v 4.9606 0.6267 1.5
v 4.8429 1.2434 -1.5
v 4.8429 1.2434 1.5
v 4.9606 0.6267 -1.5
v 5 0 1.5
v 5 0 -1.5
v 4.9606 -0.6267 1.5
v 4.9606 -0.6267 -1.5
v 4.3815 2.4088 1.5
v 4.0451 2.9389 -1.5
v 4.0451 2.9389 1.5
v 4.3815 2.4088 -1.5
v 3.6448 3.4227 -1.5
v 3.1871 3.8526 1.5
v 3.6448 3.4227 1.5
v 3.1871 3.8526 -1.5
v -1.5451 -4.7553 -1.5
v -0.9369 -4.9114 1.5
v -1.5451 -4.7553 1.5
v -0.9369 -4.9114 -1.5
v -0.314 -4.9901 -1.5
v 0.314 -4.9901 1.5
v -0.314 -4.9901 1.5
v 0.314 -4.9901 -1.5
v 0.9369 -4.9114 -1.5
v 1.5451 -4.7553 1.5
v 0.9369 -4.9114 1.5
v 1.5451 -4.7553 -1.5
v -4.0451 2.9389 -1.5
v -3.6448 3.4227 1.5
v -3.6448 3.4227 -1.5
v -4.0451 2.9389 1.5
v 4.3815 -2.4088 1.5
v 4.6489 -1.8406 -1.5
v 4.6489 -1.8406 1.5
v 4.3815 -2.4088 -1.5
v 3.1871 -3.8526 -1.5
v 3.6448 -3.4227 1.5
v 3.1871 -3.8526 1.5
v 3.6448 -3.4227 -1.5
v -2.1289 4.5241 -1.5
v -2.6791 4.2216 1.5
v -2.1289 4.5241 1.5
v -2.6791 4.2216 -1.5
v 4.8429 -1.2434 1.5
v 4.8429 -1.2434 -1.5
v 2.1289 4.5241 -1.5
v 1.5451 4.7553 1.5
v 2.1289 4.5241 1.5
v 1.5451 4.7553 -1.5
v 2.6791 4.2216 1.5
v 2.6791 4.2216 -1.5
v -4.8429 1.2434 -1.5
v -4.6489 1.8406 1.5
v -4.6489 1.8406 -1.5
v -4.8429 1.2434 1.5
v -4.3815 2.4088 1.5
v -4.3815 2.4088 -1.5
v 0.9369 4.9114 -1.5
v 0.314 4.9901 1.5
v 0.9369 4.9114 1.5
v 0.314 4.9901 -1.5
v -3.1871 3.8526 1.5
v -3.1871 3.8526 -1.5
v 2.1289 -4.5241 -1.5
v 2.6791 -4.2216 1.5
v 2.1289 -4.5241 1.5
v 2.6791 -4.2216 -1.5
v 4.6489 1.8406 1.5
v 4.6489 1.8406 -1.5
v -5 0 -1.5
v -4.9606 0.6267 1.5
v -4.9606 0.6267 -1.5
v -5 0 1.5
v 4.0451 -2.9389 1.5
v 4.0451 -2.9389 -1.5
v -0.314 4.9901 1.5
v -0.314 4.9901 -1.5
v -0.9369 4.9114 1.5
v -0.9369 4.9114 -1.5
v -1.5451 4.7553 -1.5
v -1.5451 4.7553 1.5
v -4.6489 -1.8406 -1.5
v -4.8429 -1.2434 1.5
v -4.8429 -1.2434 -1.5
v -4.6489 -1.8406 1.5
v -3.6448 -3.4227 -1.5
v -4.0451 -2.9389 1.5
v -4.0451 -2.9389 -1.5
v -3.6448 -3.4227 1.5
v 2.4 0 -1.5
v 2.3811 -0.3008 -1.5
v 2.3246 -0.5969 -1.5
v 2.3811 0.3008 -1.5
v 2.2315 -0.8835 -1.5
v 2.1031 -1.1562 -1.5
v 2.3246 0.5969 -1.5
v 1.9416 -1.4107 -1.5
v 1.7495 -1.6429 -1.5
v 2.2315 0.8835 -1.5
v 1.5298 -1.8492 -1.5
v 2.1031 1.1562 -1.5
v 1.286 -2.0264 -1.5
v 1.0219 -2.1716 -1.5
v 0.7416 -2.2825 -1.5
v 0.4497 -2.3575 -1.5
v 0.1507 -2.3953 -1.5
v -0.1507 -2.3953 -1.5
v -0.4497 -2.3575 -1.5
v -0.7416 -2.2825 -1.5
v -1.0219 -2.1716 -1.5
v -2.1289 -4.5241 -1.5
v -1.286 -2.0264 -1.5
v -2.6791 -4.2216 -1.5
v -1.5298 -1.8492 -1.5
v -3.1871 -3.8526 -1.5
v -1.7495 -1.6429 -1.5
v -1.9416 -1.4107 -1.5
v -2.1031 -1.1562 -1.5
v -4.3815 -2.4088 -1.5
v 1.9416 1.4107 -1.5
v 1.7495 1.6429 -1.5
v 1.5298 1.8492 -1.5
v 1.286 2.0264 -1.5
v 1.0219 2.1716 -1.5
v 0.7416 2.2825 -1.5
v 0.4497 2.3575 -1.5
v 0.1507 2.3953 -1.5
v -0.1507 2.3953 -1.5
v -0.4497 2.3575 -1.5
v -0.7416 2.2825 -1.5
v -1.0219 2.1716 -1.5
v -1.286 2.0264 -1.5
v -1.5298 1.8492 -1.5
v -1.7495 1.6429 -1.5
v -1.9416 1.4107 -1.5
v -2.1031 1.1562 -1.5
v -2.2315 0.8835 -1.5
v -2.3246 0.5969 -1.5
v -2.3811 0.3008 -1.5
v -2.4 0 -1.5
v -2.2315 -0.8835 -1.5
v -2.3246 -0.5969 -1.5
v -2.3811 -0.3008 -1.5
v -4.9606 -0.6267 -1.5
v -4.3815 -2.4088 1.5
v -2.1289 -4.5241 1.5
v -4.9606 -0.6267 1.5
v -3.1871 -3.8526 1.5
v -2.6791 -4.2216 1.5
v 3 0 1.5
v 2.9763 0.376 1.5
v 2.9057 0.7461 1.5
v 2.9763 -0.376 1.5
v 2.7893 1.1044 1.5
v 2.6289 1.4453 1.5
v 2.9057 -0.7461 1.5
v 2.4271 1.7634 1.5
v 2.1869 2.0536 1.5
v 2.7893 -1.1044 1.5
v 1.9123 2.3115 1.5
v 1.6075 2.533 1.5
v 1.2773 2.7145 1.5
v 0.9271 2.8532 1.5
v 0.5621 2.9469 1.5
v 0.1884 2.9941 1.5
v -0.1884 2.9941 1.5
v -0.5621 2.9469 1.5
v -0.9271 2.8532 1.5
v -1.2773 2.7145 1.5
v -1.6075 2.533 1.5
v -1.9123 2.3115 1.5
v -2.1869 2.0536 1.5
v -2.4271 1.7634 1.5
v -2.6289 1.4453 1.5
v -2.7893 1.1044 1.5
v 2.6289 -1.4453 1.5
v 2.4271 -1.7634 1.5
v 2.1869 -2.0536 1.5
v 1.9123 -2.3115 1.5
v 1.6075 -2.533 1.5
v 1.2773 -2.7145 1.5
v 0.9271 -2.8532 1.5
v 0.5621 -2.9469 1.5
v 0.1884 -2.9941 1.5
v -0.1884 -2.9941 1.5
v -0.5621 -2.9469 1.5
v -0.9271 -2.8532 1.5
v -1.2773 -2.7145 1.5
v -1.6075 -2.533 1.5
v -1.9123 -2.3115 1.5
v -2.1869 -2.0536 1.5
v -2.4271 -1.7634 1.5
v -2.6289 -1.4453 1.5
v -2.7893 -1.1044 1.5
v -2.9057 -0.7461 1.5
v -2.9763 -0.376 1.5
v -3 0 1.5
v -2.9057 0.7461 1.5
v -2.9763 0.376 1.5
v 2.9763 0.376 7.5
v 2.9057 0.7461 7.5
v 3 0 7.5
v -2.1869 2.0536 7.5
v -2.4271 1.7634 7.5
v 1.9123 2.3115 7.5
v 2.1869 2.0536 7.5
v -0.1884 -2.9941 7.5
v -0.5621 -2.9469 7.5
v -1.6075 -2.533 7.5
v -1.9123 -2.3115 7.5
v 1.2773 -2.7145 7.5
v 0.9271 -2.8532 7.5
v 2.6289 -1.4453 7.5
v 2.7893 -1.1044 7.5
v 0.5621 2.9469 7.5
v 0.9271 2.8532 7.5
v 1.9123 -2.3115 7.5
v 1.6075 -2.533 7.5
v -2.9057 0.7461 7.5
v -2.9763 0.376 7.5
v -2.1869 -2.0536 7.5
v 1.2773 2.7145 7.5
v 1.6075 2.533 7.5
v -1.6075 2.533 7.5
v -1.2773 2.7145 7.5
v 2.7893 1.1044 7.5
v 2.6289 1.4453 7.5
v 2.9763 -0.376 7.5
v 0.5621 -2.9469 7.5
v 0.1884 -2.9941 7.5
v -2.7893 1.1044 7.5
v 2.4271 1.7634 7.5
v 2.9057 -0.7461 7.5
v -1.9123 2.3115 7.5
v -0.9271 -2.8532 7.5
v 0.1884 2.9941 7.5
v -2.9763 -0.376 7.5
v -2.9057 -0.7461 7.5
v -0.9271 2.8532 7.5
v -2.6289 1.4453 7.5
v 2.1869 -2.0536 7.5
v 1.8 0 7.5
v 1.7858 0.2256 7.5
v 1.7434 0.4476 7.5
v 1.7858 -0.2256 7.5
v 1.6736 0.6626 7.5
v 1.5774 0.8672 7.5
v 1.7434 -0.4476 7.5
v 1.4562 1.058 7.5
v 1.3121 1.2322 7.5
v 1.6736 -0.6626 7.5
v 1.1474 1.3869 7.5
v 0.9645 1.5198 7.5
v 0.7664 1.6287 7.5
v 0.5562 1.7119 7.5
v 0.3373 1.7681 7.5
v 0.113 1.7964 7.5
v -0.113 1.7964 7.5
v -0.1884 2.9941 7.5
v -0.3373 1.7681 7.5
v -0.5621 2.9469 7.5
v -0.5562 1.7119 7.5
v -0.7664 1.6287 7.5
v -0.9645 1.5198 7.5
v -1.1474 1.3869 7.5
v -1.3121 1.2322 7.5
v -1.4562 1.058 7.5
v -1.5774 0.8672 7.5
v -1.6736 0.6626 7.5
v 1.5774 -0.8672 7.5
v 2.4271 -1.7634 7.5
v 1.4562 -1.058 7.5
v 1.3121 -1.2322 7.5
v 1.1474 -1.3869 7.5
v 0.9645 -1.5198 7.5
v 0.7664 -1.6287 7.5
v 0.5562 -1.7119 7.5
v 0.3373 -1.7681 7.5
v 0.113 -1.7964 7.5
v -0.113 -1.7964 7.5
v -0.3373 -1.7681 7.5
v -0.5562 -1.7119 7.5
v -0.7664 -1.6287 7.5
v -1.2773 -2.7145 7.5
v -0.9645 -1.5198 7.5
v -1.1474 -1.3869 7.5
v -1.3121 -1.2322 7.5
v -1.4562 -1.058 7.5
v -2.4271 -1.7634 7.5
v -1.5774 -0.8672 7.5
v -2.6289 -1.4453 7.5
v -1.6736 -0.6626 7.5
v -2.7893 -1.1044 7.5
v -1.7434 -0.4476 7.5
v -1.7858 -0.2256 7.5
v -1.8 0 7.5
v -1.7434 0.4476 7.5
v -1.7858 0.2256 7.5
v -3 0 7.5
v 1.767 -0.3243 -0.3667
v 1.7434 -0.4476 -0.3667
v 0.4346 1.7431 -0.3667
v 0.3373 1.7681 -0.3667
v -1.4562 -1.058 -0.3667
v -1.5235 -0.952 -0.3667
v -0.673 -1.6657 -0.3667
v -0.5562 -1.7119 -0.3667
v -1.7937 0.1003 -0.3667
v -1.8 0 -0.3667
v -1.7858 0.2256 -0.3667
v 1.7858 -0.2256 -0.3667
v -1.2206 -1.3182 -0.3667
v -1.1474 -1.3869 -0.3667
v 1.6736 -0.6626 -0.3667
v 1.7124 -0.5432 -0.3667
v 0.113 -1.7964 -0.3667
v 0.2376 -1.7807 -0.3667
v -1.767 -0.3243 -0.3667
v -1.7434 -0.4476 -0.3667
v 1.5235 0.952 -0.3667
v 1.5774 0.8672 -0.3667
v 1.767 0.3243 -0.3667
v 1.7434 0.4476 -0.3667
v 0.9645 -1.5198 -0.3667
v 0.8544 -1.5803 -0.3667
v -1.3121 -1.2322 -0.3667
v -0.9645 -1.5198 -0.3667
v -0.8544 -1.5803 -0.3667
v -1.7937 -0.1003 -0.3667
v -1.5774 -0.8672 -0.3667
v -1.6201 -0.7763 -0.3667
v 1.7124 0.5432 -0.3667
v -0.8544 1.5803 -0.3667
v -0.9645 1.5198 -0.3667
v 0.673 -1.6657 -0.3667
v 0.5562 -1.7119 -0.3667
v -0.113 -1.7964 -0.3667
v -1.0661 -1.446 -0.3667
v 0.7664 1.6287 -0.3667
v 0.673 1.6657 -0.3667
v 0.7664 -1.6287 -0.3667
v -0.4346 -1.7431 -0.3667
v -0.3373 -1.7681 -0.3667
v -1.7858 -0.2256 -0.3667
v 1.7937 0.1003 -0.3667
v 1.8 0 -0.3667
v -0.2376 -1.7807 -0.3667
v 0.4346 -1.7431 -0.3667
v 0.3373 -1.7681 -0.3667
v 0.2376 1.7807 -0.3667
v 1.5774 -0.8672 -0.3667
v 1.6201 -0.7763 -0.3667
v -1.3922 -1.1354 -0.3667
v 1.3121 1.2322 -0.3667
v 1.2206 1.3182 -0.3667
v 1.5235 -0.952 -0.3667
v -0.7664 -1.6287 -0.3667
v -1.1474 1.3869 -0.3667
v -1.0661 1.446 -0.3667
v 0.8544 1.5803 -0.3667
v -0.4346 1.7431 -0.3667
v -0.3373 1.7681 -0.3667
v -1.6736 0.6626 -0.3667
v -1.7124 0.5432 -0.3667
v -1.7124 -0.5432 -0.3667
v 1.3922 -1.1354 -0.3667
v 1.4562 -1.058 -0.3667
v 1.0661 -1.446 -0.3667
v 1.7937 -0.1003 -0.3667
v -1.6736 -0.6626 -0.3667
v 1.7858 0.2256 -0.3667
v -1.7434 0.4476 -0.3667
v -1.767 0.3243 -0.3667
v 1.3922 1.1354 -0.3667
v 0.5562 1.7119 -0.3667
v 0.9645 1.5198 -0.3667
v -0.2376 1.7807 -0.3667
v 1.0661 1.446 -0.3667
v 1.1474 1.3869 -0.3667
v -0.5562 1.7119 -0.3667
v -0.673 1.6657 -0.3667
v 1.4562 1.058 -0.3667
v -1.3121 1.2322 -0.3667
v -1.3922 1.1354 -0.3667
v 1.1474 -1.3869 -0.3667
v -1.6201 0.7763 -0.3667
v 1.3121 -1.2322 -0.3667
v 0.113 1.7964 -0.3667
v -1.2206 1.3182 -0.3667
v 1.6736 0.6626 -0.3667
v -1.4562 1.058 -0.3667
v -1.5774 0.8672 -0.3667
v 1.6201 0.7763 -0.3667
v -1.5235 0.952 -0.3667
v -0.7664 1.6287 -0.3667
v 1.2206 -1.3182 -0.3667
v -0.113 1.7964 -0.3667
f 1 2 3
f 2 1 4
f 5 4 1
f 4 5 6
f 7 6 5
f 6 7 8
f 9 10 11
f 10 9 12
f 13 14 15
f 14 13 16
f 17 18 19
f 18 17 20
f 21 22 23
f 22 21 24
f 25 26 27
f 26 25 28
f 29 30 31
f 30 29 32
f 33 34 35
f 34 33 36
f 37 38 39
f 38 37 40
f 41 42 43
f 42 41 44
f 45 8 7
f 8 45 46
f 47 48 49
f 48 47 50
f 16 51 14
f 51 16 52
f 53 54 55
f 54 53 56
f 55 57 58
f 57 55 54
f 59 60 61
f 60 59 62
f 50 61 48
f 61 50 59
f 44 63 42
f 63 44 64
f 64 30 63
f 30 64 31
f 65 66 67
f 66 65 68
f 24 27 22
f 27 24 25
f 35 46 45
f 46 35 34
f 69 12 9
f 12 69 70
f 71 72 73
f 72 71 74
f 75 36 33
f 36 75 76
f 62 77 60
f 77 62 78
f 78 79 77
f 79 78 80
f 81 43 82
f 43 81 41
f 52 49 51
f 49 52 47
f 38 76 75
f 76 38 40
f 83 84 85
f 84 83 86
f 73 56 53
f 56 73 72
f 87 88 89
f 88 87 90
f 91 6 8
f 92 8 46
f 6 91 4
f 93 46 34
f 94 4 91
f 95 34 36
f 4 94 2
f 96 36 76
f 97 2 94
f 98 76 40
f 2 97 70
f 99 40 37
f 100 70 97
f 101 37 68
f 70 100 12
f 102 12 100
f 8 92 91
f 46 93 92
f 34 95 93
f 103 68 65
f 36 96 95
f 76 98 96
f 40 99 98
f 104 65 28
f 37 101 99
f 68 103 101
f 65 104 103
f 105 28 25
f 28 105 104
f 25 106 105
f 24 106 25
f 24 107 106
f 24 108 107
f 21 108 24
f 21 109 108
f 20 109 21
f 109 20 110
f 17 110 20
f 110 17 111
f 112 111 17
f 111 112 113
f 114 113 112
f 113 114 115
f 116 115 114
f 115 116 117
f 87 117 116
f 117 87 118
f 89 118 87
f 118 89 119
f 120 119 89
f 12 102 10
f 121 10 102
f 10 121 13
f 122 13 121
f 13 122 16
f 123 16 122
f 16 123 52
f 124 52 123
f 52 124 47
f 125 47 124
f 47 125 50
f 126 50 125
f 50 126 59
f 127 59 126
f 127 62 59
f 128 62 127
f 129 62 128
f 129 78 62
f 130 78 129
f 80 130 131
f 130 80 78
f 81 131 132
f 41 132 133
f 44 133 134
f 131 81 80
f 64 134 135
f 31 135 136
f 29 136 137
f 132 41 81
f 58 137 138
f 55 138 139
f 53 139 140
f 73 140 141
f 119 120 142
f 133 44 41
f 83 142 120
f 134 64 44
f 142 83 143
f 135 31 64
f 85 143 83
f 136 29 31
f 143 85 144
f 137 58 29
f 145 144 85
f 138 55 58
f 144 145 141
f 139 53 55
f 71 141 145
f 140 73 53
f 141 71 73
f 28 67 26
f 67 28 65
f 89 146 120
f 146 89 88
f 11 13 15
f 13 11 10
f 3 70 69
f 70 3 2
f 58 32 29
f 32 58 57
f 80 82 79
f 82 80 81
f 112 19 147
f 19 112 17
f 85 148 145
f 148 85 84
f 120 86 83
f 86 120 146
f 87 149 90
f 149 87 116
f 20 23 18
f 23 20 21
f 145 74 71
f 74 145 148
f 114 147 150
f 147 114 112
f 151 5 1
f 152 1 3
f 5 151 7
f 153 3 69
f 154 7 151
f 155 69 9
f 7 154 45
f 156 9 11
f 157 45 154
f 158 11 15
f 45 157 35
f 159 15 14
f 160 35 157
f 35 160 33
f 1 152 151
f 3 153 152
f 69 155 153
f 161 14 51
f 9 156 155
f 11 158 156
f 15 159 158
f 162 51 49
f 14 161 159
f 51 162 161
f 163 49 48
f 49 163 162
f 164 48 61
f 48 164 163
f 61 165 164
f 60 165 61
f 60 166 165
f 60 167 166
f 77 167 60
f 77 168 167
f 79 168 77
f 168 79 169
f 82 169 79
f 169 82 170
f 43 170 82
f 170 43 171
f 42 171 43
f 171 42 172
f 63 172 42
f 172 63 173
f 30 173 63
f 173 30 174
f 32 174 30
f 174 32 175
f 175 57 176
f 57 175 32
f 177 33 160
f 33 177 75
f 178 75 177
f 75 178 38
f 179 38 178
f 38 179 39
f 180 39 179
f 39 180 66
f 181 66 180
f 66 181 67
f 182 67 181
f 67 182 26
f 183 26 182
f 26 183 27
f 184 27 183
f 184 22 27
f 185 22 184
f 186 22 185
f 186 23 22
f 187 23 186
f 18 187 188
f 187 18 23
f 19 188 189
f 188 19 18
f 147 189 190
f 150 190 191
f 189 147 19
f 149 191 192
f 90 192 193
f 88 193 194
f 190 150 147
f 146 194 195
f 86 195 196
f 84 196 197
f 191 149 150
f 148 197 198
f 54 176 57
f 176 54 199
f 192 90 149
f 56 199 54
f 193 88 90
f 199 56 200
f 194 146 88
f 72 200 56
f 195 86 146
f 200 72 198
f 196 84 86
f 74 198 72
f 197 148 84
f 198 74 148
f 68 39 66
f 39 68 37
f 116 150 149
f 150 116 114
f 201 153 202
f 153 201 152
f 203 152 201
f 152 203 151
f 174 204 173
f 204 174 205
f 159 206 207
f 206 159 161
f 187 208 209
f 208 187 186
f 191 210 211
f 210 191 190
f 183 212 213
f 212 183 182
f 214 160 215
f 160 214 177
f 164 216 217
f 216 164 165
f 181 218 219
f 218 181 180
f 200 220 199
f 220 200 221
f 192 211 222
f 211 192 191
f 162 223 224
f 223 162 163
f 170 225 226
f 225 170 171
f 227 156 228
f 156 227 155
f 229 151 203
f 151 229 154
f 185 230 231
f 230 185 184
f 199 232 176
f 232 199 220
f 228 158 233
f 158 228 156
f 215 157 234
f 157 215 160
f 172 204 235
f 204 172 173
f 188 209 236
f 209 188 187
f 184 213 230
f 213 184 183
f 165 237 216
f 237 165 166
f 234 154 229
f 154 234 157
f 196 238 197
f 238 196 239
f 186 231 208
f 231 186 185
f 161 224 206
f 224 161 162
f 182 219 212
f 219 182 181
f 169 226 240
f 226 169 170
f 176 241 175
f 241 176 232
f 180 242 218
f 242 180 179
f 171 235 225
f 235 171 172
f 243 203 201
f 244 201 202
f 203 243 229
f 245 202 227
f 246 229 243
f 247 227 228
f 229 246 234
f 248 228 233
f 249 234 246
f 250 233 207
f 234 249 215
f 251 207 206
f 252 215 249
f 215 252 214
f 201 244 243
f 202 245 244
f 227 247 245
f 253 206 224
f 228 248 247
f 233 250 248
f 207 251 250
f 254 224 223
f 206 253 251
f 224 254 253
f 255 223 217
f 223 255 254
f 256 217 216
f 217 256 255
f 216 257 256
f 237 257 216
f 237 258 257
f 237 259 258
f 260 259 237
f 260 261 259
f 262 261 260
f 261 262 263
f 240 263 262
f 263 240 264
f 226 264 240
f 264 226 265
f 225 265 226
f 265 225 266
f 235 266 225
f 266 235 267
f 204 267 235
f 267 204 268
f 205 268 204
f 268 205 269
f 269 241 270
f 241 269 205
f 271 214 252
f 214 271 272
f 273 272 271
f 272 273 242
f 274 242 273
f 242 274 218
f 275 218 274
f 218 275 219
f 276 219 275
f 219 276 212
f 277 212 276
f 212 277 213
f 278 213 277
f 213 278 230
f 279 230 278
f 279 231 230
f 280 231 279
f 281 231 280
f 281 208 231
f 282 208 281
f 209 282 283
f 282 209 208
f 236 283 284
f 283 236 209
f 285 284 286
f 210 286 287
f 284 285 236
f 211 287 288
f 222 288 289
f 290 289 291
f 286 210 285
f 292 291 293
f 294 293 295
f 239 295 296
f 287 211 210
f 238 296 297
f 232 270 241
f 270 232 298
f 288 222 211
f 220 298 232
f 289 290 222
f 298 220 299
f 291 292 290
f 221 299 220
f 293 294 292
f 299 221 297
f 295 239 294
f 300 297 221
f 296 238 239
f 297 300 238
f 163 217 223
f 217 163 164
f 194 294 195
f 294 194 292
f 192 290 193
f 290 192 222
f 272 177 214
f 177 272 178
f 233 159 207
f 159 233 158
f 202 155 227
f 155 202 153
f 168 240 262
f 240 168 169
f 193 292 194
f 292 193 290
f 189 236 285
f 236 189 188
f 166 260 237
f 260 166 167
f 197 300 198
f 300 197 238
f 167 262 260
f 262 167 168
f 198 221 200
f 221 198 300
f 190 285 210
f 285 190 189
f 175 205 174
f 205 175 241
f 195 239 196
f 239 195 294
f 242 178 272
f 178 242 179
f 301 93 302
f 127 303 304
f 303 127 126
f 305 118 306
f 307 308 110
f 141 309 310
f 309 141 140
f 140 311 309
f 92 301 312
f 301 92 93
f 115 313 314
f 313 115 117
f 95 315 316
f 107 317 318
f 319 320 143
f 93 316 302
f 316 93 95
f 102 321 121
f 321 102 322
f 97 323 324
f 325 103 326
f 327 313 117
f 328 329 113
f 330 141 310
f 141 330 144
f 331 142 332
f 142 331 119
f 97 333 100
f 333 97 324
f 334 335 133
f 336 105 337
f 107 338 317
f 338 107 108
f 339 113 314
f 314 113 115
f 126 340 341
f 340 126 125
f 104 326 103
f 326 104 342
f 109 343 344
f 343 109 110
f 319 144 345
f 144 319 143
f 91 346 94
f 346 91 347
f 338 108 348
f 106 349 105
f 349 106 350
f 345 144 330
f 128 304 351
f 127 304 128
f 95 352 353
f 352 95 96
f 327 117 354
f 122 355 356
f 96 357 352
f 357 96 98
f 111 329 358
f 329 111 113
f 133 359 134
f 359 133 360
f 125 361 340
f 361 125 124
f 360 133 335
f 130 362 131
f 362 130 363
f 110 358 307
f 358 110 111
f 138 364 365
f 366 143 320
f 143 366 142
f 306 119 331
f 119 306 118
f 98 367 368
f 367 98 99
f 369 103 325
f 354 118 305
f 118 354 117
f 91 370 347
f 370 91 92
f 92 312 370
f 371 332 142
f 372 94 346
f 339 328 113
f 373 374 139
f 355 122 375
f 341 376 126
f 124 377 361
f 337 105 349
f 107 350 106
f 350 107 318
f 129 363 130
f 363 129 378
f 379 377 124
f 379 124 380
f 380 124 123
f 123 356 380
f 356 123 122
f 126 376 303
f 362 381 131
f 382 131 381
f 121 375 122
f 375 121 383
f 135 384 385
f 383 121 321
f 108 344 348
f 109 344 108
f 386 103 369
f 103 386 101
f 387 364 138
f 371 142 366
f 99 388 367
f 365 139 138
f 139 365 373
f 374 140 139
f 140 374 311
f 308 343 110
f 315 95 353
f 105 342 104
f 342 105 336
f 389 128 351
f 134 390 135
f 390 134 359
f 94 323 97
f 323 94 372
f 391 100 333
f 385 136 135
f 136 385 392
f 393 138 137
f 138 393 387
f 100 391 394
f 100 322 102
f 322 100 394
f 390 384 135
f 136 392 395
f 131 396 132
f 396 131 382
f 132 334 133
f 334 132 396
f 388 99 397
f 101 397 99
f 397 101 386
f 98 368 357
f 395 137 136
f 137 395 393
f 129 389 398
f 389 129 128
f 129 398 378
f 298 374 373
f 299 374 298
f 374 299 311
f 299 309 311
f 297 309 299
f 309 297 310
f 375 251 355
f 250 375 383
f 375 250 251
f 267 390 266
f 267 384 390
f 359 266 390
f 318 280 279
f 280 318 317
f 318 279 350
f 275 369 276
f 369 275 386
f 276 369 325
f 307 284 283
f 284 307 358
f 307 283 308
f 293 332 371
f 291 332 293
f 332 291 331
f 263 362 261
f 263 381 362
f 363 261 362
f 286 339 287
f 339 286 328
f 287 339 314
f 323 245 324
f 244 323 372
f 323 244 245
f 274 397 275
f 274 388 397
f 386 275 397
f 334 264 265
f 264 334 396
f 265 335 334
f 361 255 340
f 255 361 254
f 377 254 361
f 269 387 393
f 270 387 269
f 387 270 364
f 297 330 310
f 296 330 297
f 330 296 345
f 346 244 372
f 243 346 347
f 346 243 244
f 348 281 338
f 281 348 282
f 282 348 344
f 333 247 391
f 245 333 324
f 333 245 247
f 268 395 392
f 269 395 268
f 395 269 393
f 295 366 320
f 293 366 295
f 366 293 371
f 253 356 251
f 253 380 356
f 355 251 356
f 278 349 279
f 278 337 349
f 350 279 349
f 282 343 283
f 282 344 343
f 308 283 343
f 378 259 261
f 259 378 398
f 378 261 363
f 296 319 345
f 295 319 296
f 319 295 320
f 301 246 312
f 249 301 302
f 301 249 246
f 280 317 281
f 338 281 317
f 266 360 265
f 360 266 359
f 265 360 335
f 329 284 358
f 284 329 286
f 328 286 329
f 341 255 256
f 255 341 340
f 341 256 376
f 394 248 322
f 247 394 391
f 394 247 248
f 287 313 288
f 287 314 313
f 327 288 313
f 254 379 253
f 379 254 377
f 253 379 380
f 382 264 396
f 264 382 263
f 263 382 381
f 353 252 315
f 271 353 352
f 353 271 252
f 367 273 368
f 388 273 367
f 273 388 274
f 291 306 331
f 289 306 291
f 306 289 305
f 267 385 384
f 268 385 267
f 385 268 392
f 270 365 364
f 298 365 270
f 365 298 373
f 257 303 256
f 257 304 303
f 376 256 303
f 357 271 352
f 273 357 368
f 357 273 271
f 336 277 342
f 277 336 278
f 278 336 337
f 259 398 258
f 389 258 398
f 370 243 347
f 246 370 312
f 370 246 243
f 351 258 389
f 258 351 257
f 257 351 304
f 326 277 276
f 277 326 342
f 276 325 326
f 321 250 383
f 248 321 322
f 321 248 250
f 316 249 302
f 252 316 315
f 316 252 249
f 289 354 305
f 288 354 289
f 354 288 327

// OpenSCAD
$fn = 50;


difference() {
	union() {
		translate(v = [0, 0, -1.5000000000]) {
			cylinder(h = 3, r = 5.0000000000);
		}
		translate(v = [0, 0, -1.5000000000]) {
			cylinder(h = 9, r = 3.0000000000);
		}
	}
	union() {
		translate(v = [0, 0, -1.5000000000]) {
			rotate(a = [0, 180, 0]) {
				difference() {
					union() {
						translate(v = [0, 0, -1.7000000000]) {
							cylinder(h = 1.7000000000, r1 = 1.5000000000, r2 = 2.4000000000);
						}
						translate(v = [0, 0, -9.0000000000]) {
							cylinder(h = 9, r = 1.5000000000);
						}
						translate(v = [0, 0, -9.0000000000]) {
							cylinder(h = 9, r = 1.8000000000);
						}
						translate(v = [0, 0, -9.0000000000]) {
							cylinder(h = 9, r = 1.5000000000);
						}
					}
					union();
				}
			}
		}
		translate(v = [0, 0, -50.0000000000]) {
			cylinder(h = 100, r = 1.5000000000);
		}
	}
}
